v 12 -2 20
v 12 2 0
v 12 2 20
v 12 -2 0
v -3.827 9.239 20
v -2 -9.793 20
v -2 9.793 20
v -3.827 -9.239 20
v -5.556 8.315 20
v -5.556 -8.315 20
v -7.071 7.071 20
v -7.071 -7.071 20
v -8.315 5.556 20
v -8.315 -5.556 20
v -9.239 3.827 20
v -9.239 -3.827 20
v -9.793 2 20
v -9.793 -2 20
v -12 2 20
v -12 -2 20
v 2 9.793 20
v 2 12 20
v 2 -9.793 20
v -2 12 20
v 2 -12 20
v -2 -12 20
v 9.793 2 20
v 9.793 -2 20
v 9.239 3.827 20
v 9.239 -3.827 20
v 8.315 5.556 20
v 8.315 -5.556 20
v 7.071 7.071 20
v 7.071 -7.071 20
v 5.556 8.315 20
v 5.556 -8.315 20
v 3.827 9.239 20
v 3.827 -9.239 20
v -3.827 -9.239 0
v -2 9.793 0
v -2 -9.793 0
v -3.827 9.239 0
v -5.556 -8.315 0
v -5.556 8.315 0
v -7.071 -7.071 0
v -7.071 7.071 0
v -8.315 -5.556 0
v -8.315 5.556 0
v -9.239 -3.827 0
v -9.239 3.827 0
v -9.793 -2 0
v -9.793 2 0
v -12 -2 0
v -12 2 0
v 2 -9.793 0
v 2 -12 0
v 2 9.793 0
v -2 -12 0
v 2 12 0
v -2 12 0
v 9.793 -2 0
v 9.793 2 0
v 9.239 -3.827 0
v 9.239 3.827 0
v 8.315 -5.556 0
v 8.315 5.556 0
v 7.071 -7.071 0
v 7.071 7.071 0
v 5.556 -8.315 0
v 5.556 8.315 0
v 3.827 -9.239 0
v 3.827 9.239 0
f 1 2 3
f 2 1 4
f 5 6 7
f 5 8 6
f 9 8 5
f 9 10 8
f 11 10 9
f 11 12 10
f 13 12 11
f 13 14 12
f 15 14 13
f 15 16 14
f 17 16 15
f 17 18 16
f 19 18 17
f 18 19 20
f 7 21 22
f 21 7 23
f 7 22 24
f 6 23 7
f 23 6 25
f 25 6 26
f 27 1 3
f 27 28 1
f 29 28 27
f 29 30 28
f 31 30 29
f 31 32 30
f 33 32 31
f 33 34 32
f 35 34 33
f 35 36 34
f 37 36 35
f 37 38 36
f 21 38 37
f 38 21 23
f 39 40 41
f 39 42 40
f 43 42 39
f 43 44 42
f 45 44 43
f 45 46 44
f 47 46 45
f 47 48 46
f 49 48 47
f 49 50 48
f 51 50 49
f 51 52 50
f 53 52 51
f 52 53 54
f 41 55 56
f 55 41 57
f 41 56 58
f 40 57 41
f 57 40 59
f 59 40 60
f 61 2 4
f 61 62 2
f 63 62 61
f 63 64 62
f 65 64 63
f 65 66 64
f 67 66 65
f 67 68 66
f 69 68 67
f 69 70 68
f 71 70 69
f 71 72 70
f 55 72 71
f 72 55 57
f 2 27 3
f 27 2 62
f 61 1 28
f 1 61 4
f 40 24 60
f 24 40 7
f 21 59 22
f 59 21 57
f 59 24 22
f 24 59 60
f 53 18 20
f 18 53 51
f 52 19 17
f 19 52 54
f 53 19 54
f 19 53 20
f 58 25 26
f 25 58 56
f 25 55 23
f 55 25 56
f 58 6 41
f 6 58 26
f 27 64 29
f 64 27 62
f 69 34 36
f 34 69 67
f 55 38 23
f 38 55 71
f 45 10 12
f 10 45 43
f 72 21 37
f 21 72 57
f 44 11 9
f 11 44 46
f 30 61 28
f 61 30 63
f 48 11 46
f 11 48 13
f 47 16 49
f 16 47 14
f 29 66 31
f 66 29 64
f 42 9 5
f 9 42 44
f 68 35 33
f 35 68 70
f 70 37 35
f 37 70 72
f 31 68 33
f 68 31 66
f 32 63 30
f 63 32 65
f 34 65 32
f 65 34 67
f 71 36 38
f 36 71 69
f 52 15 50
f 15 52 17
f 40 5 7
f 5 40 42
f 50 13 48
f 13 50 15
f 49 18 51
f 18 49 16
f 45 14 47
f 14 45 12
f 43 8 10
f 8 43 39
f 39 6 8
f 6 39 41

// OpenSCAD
// A cylindrical wall interrupted by four ribs.
//
// This is the fixture for the partial cylinder: no arc of the wall closes on
// itself, so none of them can be written as a periodic face bounded by two
// full circles. Each arc has to come out as a CYLINDRICAL_SURFACE bounded by
// an arc at either rim and the band's two straight end edges, and the runs of
// edges those arcs replace sit inside the loops of the top and bottom face -
// which is the part that has to leave the shell watertight.
//
// The ribs also have flat quad side faces welded to the wall, which is what
// caught the band walk running off the surface it started on: it crossed a
// vertical edge into the rib, through it, and back into the next arc, and the
// ring then failed to fit anything at all. A band is grown only through facets
// which sit on the surface the seed does.
//
// Four of the six facets between two ribs are collapsed, not all six. The rib's
// flat face cuts the facet it lands in through that facet's *chord*, and a
// chord runs inside the arc it subtends: the corner it leaves behind sits at
// r=9.99515, five thousandths inside the wall. Those two trapezoids at each end
// are not on the cylinder and have to stay planar, or the arc's end would be
// pulled out onto the true circle and open the shell against the rib. So the
// expected figure is 4 surfaces, 16 facets replaced, 38 faces down to 26.
//
// The ribs run the full height on purpose. That keeps both rims of every arc
// bordering a single face (the top or the bottom disc), which is the case the
// exporter handles; a rib stopping short would leave a rim bordering one face
// per facet, and the arc is then correctly left faceted.
//
// Measured, and asserted by the driver: what the exporter has to report for
// the above to have happened. A silently faceted export is still a valid one,
// so validity alone cannot see a recogniser that has stopped recognising.
// EXPECT: 1 analytic surface available (1 cylindrical, 0 spherical, 0 toroidal, 0 Bezier)
// EXPECT: 4 surfaces recognised (0 toroidal, 0 spherical, 0 conical, 4 partial), 16 facets replaced
//
// Four arcs and the twenty-two flats: the two discs, the ribs' three faces
// each, and the eight trapezoids the fixture explains above. No VOLUME: line,
// and deliberately. This export is a hybrid - four arcs of the wall are the
// true cylinder and the rest is still chords - so the figure is neither the
// polygon's nor the circle's but a mixture of the two, and a number that can
// only be got by running the exporter is exactly what these lines are meant
// not to be.
// ROUNDTRIP: Cylinder=4 Plane=22
//
// Every facet its maker named for a declared surface is D0 by that heritage,
// whole or cut, and has to end in a face written on that surface (checklist
// B6, B7, E8). A facet a boolean cut is not in its surface's D0 region yet -
// the region holds whole facets only - so nothing proposes it at the exact
// tier, and at the approximation tier a statistic over the tessellation
// refuses it (C3). Measured 2026-09-29:
//   approximation tier, 8 facets (8 cut): 8 on cylinder 0 (a quadric face: the region's worst
//     corner strays further than the region's tessellation band)
//   exact tier, 8 facets (8 cut): 8 on cylinder 0 (claimed by nothing for it)
// Tolerated by name until cut facets join their region and no statistic
// vetoes a named facet (doc/step-export-wip.md, open item 34); the test
// fails the day it is no longer raised.
// KNOWN-EXPORT-ERROR: facets named by their maker for a declared surface are not written on it
$fn = 32;
union() {
  cylinder(h = 20, r = 10);
  for (i = [0:3]) {
    rotate([0, 0, i * 90]) translate([8, -2, 0]) cube([4, 4, 20]);
  }
}
